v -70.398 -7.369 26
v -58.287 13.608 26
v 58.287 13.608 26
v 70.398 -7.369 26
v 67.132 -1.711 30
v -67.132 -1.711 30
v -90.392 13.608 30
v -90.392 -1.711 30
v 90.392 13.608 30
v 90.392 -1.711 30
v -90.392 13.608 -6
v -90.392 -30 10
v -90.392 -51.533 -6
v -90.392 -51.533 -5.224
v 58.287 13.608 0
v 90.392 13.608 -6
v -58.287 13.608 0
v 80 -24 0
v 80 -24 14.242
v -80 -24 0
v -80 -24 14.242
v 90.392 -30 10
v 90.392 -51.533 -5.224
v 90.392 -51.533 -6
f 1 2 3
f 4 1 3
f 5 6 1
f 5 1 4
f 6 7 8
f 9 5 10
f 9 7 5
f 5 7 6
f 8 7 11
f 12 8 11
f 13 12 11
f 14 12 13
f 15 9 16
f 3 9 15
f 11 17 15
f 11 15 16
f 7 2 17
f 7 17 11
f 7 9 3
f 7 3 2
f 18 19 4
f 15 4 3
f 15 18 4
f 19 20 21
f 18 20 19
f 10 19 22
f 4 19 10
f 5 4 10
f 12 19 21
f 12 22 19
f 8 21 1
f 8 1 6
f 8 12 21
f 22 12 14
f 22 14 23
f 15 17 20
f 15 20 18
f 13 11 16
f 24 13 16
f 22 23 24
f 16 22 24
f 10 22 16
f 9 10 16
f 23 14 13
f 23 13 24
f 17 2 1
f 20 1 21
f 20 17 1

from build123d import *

# Parameters (mm, degrees)
F1_DEPTH    = 30
F2_T1_DEPTH = 326.8852689227
F3_DEPTH    = 30
F0_W        = 180.7846096908
F0_H        = 21.5329241753
F6_DEPTH    = 25
F7_DEPTH    = 6
F5_W        = 259.5228254795
F5_H        = 121.416632086
F8_DEPTH    = 25
F9_DEPTH    = 26


# Not quite as in the source:
# - a fillet or chamfer that OpenCascade refuses, or shapes differently, is made with other operations: its cross-section is extruded or revolved along the edge and cut away or added


with BuildPart() as f1:
    # F0 (on Top) → F1 (new body)
    with BuildSketch(Plane.XY):
        Polygon((80, -24), (-80, -24), (-58.2867488807, 13.6084541361), (-65.214952111, 13.6084541361), (-73.0717967697, 0), (-90.3923048454, -30), (90.3923048454, -30), (73.0717967697, 0), (65.214952111, 13.6084541361), (58.2867488807, 13.6084541361), align=None)
        Polygon((-90.3923048454, -30), (-73.0717967697, 0), (-90.3923048454, 0), align=None)
        Polygon((90.3923048454, 0), (73.0717967697, 0), (90.3923048454, -30), align=None)
        Polygon((-73.0717967697, 0), (-65.214952111, 13.6084541361), (-90.3923048454, 13.6084541361), (-90.3923048454, 0), align=None)
        Polygon((90.3923048454, 13.6084541361), (65.214952111, 13.6084541361), (73.0717967697, 0), (90.3923048454, 0), align=None)
    extrude(amount=F1_DEPTH)

    # F2: chamfer of 20 x 28.2888686106 on 1 edges, made by hand

    # F2_s2 → F2_t1 (cut)
    with BuildSketch(Plane.YZ.offset(-163.4426344613)):
        Polygon((-30, 10), (-1.7111313894, 30), (-30, 30), align=None)
    extrude(amount=F2_T1_DEPTH, mode=Mode.SUBTRACT)

    # F0 (on Top) → F3 (join)
    with BuildSketch(Plane.XY):
        Polygon((-58.2867488807, 13.6084541361), (-80, -24), (80, -24), (58.2867488807, 13.6084541361), align=None)
    extrude(amount=F3_DEPTH)

    # F0 (on Top) → F6 (join)
    with BuildSketch(Plane.XY):
        with Locations((0, -40.7664620876)):
            Rectangle(F0_W, F0_H)
    extrude(amount=F6_DEPTH)

    # F0 (on Top) → F7 (join)
    with BuildSketch(Plane.XY):
        Polygon((-58.2867488807, 13.6084541361), (-80, -24), (80, -24), (58.2867488807, 13.6084541361), align=None)
        Polygon((80, -24), (-80, -24), (-58.2867488807, 13.6084541361), (-65.214952111, 13.6084541361), (-73.0717967697, 0), (-90.3923048454, -30), (90.3923048454, -30), (73.0717967697, 0), (65.214952111, 13.6084541361), (58.2867488807, 13.6084541361), align=None)
        Polygon((-90.3923048454, -30), (-73.0717967697, 0), (-90.3923048454, 0), align=None)
        Polygon((-73.0717967697, 0), (-65.214952111, 13.6084541361), (-90.3923048454, 13.6084541361), (-90.3923048454, 0), align=None)
        Polygon((90.3923048454, 13.6084541361), (65.214952111, 13.6084541361), (73.0717967697, 0), (90.3923048454, 0), align=None)
        Polygon((90.3923048454, 0), (73.0717967697, 0), (90.3923048454, -30), align=None)
        with Locations((0, -40.7664620876)):
            Rectangle(F0_W, F0_H)
    extrude(amount=-F7_DEPTH)

    # F5 (on offset) → F8 (cut)
    with BuildSketch(Plane(origin=(0, -14.7116228469, 20.8087582883), x_dir=(1, 0, 0), z_dir=(0, -0.5772877121, 0.8165408119))):
        with Locations((5.841344595, -0.7894355804)):
            Rectangle(F5_W, F5_H)
    extrude(amount=F8_DEPTH, mode=Mode.SUBTRACT)

    # F0 (on Top) → F9 (cut)
    with BuildSketch(Plane.XY):
        Polygon((-58.2867488807, 13.6084541361), (-80, -24), (80, -24), (58.2867488807, 13.6084541361), align=None)
    extrude(amount=F9_DEPTH, mode=Mode.SUBTRACT)


solid = f1.part
